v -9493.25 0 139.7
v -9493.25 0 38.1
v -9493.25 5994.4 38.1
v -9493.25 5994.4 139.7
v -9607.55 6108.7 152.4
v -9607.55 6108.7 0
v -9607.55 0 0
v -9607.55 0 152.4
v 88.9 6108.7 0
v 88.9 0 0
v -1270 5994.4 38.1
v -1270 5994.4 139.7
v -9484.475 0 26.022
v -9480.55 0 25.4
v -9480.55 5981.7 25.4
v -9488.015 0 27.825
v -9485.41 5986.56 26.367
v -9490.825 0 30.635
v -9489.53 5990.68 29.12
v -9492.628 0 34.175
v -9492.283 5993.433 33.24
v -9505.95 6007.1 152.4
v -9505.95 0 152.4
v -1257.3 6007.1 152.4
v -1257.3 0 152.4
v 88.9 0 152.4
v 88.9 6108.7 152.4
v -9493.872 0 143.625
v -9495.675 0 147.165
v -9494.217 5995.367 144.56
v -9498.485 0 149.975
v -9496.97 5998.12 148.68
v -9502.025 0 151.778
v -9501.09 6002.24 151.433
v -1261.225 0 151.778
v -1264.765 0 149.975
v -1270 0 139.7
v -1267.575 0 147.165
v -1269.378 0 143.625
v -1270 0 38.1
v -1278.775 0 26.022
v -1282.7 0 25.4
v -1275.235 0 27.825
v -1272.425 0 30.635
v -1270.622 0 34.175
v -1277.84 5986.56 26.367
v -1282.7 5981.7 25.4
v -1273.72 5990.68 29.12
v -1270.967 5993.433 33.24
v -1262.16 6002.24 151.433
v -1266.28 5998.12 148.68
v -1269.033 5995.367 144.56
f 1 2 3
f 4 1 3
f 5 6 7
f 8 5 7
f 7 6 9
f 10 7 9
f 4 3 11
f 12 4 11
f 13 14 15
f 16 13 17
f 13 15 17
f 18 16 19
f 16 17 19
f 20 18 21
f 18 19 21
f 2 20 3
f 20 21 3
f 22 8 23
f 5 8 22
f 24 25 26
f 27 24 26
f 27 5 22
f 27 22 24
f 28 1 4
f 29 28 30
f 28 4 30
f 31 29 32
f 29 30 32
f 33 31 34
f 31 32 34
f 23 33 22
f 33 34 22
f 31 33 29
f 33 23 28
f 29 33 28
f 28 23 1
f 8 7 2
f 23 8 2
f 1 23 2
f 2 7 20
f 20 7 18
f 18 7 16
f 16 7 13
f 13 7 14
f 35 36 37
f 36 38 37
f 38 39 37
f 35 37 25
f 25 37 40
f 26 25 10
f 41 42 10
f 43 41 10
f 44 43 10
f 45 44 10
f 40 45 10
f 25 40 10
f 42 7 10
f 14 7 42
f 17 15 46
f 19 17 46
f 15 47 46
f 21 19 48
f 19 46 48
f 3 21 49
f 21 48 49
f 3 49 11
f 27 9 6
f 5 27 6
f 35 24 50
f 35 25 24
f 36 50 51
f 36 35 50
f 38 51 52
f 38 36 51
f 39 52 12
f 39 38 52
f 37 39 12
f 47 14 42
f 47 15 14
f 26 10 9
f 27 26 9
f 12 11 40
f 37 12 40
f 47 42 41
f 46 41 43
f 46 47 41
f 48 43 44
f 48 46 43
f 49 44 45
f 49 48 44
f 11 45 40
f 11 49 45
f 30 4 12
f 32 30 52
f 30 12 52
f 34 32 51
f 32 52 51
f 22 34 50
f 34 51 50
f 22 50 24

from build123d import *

# Parameters (mm, degrees)
F0_W     = 8223.25
F0_H     = 5994.4
F1_DEPTH = 25.4
F2_DEPTH = 152.4
F3_R     = 12.7


with BuildPart() as f1:
    # F0 (on Top) → F1 (new body)
    with BuildSketch(Plane.XY):
        with Locations((-5381.625, 2997.2)):
            Rectangle(F0_W, F0_H)
    extrude(amount=F1_DEPTH)

    # F0 (on Top) → F2 (join)
    with BuildSketch(Plane.XY):
        Polygon((-1270, 0), (0, 0), (88.9, 0), (88.9, 6108.7), (-9607.55, 6108.7), (-9607.55, 0), (-9493.25, 0), (-9493.25, 5994.4), (-1270, 5994.4), align=None)
    extrude(amount=F2_DEPTH)

    # F3
    f3_edges = [f1.edges().sort_by_distance(p)[0] for p in [
        (-1270, 2997.2, 152.4),
        (-1270, 2997.2, 25.4),
        (-5381.625, 5994.4, 25.4),
        (-9493.25, 2997.2, 25.4),
        (-9493.25, 2997.2, 152.4),
        (-5381.625, 5994.4, 152.4),
    ]]
    fillet(f3_edges, radius=F3_R)


solid = f1.part
